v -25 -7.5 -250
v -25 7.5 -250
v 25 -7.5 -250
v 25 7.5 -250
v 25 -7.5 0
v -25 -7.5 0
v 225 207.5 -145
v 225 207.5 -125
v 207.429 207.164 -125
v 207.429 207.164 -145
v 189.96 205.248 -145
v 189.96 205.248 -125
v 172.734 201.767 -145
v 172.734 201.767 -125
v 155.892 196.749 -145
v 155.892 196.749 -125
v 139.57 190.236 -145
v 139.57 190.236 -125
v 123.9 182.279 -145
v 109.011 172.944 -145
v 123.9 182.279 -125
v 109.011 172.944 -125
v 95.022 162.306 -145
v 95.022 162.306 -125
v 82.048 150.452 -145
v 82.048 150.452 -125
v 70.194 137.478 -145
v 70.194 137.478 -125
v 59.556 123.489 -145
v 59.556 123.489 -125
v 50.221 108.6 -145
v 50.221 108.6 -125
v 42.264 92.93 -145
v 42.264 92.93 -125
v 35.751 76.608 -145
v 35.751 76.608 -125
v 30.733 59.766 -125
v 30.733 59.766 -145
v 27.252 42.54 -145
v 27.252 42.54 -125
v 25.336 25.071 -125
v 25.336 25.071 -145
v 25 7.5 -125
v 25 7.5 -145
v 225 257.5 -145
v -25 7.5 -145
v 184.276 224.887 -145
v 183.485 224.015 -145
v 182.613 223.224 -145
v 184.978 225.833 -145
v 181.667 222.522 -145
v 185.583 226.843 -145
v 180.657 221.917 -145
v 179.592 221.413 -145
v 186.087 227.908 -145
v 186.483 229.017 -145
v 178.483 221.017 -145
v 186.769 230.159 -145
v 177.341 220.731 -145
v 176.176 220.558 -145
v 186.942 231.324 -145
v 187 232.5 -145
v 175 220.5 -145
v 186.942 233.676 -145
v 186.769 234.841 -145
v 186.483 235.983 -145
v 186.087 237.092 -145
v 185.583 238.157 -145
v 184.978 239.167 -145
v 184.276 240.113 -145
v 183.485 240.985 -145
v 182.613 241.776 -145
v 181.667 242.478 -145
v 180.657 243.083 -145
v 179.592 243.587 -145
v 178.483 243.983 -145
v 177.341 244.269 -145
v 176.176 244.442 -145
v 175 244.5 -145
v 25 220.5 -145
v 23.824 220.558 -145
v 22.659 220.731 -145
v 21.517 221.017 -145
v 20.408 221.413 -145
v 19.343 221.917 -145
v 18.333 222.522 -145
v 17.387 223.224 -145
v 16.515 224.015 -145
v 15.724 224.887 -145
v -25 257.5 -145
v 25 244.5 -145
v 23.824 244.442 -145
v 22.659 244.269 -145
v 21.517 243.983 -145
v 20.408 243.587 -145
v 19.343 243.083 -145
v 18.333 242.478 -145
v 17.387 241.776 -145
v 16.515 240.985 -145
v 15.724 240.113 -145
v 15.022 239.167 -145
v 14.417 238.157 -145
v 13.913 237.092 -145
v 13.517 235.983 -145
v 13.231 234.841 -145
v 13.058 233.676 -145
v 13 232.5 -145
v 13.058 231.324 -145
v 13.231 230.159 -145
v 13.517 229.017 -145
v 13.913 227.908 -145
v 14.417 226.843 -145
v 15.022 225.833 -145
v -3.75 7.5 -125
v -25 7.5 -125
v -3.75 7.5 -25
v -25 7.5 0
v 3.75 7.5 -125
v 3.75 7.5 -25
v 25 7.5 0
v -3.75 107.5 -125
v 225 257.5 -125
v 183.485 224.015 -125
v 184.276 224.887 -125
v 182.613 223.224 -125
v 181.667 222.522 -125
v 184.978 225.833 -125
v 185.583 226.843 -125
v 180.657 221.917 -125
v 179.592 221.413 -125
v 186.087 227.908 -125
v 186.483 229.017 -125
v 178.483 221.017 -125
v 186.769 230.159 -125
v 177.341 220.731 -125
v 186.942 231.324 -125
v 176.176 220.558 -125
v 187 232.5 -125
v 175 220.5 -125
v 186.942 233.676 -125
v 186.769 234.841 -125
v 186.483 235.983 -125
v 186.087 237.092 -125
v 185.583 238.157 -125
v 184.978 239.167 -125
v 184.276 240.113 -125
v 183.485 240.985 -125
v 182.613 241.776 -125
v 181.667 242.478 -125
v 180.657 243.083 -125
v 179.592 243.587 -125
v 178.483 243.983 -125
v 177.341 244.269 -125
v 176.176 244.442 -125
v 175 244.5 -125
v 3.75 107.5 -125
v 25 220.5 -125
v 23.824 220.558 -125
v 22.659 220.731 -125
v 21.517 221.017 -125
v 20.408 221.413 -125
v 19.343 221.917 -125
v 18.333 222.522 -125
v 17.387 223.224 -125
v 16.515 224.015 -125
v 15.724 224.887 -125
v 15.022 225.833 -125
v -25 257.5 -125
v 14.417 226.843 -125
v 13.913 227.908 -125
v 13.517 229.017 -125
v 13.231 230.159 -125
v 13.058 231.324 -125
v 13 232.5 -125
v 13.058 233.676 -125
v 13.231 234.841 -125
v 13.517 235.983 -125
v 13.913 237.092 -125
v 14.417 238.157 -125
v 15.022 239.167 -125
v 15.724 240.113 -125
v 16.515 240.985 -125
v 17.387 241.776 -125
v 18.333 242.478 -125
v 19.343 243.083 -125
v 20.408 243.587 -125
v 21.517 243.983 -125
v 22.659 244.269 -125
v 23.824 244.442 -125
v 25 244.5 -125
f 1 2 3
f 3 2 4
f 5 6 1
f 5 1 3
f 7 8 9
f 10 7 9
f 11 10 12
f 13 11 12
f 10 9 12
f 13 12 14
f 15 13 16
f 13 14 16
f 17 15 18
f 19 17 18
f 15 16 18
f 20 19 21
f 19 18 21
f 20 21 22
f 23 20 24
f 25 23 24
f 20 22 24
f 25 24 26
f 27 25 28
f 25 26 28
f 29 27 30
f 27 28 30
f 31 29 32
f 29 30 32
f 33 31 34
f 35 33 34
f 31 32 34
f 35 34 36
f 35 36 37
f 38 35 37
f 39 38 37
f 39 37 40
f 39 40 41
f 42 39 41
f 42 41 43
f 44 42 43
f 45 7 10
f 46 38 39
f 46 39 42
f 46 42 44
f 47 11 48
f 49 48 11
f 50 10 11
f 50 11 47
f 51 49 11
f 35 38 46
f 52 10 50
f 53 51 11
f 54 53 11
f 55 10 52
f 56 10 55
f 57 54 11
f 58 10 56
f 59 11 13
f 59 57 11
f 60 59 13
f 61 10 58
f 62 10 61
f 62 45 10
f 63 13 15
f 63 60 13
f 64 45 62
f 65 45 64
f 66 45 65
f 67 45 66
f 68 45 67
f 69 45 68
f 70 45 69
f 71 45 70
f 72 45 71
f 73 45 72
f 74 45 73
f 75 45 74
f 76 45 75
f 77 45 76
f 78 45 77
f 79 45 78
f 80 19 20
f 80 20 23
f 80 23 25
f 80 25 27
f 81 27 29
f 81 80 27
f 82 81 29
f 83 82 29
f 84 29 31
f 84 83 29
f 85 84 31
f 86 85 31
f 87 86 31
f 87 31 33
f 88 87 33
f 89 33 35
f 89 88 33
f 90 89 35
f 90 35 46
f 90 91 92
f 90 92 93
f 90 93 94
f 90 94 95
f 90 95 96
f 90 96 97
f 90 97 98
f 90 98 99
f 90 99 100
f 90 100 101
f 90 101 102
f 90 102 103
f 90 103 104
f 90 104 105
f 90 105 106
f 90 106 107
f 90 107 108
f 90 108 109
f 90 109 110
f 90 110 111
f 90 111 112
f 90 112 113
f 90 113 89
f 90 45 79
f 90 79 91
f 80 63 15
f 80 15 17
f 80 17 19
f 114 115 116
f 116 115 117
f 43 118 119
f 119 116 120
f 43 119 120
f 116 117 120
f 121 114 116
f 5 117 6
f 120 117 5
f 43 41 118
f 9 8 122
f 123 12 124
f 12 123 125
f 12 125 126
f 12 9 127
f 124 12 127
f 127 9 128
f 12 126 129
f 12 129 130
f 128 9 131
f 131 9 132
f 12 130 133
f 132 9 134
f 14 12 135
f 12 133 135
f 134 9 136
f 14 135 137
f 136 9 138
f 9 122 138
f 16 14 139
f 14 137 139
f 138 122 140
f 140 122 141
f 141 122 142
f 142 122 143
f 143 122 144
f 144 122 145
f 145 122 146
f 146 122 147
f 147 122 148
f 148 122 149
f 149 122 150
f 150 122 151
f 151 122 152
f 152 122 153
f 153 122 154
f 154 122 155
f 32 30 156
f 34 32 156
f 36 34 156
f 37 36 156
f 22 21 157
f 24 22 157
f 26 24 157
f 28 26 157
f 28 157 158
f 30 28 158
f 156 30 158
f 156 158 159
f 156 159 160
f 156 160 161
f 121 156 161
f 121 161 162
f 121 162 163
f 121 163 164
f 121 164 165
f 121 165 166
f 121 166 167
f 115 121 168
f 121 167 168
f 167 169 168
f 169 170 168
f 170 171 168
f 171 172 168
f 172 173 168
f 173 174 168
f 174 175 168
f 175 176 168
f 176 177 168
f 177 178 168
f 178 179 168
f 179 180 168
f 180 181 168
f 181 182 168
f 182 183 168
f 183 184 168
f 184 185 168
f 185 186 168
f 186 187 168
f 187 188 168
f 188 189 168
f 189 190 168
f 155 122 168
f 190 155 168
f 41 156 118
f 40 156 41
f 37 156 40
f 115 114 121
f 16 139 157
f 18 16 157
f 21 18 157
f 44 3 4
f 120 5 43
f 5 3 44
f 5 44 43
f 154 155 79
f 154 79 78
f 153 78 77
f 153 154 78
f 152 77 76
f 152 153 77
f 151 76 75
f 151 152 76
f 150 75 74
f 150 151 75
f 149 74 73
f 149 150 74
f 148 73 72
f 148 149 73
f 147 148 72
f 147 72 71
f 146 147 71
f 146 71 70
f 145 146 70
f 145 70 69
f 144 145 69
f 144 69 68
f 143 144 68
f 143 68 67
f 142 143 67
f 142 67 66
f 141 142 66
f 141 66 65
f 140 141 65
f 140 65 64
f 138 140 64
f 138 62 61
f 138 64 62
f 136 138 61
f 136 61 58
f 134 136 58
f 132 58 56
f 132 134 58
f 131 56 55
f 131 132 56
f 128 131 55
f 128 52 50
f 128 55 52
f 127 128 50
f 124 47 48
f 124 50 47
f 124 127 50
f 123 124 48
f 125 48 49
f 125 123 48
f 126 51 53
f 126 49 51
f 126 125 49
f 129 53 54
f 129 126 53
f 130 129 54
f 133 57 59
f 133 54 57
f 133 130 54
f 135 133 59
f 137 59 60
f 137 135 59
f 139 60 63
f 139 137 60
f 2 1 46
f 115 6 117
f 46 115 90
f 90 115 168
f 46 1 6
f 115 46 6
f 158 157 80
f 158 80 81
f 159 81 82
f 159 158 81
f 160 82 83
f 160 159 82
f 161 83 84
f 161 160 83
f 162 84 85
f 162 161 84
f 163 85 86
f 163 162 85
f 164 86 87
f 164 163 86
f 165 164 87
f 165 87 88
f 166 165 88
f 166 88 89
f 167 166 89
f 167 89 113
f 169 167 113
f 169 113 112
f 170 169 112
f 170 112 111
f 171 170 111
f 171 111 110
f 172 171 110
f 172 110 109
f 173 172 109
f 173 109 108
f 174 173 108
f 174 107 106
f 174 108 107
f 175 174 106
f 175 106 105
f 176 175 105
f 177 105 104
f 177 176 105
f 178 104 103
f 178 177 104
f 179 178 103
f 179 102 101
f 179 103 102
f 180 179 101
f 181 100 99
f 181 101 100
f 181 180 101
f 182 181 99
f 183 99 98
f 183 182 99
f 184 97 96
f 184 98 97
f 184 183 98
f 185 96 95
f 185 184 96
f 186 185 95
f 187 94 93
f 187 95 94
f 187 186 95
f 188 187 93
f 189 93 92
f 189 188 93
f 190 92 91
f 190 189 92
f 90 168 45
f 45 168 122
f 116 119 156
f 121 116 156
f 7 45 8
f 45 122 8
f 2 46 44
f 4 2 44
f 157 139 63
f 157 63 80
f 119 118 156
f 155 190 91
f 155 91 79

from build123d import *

# Parameters (mm, degrees)
SKETCH1_W           = 50
SKETCH1_H           = 15
BOSS_EXTRUDE1_DEPTH = 250
BOSS_EXTRUDE3_START = -135
BOSS_EXTRUDE3_DEPTH = 10
BOSS_EXTRUDE4_DEPTH = 3.75
CUT_EXTRUDE1_DEPTH  = 365.082751583


with BuildPart() as part:
    # Sketch1 → Boss-Extrude1 (new body)
    with BuildSketch(Plane.XY):
        Rectangle(SKETCH1_W, SKETCH1_H)
    extrude(amount=-BOSS_EXTRUDE1_DEPTH)

    # Sketch2 → Boss-Extrude3 (add, symmetric)
    with BuildSketch(Plane.XY.offset(BOSS_EXTRUDE3_START)):
        with BuildLine():
            Line((-25, 7.5), (-25, 257.5))
            Line((-25, 257.5), (225, 257.5))
            Line((225, 257.5), (225, 207.5))
            ThreePointArc((225, 207.5), (82.048365399, 150.451634601), (25, 7.5))
            Line((25, 7.5), (-25, 7.5))
        make_face()
    extrude(amount=BOSS_EXTRUDE3_DEPTH, both=True)

    # Sketch4 → Boss-Extrude4 (add, symmetric)
    with BuildSketch(Plane(origin=(0, 0, 0), x_dir=(0, 0, -1), z_dir=(1, 0, 0))):
        Polygon((25, 7.5), (125, 107.5), (125, 7.5), align=None)
    extrude(amount=BOSS_EXTRUDE4_DEPTH, both=True)

    # Sketch5 → Cut-Extrude1 (cut, through all)
    with BuildSketch(Plane.XY.offset(-125)):
        with BuildLine():
            Line((25, 244.5), (175, 244.5))
            ThreePointArc((175, 244.5), (187, 232.5), (175, 220.5))
            Line((175, 220.5), (25, 220.5))
            ThreePointArc((25, 220.5), (13, 232.5), (25, 244.5))
        make_face()
    extrude(amount=-CUT_EXTRUDE1_DEPTH, mode=Mode.SUBTRACT)


solid = part.part
